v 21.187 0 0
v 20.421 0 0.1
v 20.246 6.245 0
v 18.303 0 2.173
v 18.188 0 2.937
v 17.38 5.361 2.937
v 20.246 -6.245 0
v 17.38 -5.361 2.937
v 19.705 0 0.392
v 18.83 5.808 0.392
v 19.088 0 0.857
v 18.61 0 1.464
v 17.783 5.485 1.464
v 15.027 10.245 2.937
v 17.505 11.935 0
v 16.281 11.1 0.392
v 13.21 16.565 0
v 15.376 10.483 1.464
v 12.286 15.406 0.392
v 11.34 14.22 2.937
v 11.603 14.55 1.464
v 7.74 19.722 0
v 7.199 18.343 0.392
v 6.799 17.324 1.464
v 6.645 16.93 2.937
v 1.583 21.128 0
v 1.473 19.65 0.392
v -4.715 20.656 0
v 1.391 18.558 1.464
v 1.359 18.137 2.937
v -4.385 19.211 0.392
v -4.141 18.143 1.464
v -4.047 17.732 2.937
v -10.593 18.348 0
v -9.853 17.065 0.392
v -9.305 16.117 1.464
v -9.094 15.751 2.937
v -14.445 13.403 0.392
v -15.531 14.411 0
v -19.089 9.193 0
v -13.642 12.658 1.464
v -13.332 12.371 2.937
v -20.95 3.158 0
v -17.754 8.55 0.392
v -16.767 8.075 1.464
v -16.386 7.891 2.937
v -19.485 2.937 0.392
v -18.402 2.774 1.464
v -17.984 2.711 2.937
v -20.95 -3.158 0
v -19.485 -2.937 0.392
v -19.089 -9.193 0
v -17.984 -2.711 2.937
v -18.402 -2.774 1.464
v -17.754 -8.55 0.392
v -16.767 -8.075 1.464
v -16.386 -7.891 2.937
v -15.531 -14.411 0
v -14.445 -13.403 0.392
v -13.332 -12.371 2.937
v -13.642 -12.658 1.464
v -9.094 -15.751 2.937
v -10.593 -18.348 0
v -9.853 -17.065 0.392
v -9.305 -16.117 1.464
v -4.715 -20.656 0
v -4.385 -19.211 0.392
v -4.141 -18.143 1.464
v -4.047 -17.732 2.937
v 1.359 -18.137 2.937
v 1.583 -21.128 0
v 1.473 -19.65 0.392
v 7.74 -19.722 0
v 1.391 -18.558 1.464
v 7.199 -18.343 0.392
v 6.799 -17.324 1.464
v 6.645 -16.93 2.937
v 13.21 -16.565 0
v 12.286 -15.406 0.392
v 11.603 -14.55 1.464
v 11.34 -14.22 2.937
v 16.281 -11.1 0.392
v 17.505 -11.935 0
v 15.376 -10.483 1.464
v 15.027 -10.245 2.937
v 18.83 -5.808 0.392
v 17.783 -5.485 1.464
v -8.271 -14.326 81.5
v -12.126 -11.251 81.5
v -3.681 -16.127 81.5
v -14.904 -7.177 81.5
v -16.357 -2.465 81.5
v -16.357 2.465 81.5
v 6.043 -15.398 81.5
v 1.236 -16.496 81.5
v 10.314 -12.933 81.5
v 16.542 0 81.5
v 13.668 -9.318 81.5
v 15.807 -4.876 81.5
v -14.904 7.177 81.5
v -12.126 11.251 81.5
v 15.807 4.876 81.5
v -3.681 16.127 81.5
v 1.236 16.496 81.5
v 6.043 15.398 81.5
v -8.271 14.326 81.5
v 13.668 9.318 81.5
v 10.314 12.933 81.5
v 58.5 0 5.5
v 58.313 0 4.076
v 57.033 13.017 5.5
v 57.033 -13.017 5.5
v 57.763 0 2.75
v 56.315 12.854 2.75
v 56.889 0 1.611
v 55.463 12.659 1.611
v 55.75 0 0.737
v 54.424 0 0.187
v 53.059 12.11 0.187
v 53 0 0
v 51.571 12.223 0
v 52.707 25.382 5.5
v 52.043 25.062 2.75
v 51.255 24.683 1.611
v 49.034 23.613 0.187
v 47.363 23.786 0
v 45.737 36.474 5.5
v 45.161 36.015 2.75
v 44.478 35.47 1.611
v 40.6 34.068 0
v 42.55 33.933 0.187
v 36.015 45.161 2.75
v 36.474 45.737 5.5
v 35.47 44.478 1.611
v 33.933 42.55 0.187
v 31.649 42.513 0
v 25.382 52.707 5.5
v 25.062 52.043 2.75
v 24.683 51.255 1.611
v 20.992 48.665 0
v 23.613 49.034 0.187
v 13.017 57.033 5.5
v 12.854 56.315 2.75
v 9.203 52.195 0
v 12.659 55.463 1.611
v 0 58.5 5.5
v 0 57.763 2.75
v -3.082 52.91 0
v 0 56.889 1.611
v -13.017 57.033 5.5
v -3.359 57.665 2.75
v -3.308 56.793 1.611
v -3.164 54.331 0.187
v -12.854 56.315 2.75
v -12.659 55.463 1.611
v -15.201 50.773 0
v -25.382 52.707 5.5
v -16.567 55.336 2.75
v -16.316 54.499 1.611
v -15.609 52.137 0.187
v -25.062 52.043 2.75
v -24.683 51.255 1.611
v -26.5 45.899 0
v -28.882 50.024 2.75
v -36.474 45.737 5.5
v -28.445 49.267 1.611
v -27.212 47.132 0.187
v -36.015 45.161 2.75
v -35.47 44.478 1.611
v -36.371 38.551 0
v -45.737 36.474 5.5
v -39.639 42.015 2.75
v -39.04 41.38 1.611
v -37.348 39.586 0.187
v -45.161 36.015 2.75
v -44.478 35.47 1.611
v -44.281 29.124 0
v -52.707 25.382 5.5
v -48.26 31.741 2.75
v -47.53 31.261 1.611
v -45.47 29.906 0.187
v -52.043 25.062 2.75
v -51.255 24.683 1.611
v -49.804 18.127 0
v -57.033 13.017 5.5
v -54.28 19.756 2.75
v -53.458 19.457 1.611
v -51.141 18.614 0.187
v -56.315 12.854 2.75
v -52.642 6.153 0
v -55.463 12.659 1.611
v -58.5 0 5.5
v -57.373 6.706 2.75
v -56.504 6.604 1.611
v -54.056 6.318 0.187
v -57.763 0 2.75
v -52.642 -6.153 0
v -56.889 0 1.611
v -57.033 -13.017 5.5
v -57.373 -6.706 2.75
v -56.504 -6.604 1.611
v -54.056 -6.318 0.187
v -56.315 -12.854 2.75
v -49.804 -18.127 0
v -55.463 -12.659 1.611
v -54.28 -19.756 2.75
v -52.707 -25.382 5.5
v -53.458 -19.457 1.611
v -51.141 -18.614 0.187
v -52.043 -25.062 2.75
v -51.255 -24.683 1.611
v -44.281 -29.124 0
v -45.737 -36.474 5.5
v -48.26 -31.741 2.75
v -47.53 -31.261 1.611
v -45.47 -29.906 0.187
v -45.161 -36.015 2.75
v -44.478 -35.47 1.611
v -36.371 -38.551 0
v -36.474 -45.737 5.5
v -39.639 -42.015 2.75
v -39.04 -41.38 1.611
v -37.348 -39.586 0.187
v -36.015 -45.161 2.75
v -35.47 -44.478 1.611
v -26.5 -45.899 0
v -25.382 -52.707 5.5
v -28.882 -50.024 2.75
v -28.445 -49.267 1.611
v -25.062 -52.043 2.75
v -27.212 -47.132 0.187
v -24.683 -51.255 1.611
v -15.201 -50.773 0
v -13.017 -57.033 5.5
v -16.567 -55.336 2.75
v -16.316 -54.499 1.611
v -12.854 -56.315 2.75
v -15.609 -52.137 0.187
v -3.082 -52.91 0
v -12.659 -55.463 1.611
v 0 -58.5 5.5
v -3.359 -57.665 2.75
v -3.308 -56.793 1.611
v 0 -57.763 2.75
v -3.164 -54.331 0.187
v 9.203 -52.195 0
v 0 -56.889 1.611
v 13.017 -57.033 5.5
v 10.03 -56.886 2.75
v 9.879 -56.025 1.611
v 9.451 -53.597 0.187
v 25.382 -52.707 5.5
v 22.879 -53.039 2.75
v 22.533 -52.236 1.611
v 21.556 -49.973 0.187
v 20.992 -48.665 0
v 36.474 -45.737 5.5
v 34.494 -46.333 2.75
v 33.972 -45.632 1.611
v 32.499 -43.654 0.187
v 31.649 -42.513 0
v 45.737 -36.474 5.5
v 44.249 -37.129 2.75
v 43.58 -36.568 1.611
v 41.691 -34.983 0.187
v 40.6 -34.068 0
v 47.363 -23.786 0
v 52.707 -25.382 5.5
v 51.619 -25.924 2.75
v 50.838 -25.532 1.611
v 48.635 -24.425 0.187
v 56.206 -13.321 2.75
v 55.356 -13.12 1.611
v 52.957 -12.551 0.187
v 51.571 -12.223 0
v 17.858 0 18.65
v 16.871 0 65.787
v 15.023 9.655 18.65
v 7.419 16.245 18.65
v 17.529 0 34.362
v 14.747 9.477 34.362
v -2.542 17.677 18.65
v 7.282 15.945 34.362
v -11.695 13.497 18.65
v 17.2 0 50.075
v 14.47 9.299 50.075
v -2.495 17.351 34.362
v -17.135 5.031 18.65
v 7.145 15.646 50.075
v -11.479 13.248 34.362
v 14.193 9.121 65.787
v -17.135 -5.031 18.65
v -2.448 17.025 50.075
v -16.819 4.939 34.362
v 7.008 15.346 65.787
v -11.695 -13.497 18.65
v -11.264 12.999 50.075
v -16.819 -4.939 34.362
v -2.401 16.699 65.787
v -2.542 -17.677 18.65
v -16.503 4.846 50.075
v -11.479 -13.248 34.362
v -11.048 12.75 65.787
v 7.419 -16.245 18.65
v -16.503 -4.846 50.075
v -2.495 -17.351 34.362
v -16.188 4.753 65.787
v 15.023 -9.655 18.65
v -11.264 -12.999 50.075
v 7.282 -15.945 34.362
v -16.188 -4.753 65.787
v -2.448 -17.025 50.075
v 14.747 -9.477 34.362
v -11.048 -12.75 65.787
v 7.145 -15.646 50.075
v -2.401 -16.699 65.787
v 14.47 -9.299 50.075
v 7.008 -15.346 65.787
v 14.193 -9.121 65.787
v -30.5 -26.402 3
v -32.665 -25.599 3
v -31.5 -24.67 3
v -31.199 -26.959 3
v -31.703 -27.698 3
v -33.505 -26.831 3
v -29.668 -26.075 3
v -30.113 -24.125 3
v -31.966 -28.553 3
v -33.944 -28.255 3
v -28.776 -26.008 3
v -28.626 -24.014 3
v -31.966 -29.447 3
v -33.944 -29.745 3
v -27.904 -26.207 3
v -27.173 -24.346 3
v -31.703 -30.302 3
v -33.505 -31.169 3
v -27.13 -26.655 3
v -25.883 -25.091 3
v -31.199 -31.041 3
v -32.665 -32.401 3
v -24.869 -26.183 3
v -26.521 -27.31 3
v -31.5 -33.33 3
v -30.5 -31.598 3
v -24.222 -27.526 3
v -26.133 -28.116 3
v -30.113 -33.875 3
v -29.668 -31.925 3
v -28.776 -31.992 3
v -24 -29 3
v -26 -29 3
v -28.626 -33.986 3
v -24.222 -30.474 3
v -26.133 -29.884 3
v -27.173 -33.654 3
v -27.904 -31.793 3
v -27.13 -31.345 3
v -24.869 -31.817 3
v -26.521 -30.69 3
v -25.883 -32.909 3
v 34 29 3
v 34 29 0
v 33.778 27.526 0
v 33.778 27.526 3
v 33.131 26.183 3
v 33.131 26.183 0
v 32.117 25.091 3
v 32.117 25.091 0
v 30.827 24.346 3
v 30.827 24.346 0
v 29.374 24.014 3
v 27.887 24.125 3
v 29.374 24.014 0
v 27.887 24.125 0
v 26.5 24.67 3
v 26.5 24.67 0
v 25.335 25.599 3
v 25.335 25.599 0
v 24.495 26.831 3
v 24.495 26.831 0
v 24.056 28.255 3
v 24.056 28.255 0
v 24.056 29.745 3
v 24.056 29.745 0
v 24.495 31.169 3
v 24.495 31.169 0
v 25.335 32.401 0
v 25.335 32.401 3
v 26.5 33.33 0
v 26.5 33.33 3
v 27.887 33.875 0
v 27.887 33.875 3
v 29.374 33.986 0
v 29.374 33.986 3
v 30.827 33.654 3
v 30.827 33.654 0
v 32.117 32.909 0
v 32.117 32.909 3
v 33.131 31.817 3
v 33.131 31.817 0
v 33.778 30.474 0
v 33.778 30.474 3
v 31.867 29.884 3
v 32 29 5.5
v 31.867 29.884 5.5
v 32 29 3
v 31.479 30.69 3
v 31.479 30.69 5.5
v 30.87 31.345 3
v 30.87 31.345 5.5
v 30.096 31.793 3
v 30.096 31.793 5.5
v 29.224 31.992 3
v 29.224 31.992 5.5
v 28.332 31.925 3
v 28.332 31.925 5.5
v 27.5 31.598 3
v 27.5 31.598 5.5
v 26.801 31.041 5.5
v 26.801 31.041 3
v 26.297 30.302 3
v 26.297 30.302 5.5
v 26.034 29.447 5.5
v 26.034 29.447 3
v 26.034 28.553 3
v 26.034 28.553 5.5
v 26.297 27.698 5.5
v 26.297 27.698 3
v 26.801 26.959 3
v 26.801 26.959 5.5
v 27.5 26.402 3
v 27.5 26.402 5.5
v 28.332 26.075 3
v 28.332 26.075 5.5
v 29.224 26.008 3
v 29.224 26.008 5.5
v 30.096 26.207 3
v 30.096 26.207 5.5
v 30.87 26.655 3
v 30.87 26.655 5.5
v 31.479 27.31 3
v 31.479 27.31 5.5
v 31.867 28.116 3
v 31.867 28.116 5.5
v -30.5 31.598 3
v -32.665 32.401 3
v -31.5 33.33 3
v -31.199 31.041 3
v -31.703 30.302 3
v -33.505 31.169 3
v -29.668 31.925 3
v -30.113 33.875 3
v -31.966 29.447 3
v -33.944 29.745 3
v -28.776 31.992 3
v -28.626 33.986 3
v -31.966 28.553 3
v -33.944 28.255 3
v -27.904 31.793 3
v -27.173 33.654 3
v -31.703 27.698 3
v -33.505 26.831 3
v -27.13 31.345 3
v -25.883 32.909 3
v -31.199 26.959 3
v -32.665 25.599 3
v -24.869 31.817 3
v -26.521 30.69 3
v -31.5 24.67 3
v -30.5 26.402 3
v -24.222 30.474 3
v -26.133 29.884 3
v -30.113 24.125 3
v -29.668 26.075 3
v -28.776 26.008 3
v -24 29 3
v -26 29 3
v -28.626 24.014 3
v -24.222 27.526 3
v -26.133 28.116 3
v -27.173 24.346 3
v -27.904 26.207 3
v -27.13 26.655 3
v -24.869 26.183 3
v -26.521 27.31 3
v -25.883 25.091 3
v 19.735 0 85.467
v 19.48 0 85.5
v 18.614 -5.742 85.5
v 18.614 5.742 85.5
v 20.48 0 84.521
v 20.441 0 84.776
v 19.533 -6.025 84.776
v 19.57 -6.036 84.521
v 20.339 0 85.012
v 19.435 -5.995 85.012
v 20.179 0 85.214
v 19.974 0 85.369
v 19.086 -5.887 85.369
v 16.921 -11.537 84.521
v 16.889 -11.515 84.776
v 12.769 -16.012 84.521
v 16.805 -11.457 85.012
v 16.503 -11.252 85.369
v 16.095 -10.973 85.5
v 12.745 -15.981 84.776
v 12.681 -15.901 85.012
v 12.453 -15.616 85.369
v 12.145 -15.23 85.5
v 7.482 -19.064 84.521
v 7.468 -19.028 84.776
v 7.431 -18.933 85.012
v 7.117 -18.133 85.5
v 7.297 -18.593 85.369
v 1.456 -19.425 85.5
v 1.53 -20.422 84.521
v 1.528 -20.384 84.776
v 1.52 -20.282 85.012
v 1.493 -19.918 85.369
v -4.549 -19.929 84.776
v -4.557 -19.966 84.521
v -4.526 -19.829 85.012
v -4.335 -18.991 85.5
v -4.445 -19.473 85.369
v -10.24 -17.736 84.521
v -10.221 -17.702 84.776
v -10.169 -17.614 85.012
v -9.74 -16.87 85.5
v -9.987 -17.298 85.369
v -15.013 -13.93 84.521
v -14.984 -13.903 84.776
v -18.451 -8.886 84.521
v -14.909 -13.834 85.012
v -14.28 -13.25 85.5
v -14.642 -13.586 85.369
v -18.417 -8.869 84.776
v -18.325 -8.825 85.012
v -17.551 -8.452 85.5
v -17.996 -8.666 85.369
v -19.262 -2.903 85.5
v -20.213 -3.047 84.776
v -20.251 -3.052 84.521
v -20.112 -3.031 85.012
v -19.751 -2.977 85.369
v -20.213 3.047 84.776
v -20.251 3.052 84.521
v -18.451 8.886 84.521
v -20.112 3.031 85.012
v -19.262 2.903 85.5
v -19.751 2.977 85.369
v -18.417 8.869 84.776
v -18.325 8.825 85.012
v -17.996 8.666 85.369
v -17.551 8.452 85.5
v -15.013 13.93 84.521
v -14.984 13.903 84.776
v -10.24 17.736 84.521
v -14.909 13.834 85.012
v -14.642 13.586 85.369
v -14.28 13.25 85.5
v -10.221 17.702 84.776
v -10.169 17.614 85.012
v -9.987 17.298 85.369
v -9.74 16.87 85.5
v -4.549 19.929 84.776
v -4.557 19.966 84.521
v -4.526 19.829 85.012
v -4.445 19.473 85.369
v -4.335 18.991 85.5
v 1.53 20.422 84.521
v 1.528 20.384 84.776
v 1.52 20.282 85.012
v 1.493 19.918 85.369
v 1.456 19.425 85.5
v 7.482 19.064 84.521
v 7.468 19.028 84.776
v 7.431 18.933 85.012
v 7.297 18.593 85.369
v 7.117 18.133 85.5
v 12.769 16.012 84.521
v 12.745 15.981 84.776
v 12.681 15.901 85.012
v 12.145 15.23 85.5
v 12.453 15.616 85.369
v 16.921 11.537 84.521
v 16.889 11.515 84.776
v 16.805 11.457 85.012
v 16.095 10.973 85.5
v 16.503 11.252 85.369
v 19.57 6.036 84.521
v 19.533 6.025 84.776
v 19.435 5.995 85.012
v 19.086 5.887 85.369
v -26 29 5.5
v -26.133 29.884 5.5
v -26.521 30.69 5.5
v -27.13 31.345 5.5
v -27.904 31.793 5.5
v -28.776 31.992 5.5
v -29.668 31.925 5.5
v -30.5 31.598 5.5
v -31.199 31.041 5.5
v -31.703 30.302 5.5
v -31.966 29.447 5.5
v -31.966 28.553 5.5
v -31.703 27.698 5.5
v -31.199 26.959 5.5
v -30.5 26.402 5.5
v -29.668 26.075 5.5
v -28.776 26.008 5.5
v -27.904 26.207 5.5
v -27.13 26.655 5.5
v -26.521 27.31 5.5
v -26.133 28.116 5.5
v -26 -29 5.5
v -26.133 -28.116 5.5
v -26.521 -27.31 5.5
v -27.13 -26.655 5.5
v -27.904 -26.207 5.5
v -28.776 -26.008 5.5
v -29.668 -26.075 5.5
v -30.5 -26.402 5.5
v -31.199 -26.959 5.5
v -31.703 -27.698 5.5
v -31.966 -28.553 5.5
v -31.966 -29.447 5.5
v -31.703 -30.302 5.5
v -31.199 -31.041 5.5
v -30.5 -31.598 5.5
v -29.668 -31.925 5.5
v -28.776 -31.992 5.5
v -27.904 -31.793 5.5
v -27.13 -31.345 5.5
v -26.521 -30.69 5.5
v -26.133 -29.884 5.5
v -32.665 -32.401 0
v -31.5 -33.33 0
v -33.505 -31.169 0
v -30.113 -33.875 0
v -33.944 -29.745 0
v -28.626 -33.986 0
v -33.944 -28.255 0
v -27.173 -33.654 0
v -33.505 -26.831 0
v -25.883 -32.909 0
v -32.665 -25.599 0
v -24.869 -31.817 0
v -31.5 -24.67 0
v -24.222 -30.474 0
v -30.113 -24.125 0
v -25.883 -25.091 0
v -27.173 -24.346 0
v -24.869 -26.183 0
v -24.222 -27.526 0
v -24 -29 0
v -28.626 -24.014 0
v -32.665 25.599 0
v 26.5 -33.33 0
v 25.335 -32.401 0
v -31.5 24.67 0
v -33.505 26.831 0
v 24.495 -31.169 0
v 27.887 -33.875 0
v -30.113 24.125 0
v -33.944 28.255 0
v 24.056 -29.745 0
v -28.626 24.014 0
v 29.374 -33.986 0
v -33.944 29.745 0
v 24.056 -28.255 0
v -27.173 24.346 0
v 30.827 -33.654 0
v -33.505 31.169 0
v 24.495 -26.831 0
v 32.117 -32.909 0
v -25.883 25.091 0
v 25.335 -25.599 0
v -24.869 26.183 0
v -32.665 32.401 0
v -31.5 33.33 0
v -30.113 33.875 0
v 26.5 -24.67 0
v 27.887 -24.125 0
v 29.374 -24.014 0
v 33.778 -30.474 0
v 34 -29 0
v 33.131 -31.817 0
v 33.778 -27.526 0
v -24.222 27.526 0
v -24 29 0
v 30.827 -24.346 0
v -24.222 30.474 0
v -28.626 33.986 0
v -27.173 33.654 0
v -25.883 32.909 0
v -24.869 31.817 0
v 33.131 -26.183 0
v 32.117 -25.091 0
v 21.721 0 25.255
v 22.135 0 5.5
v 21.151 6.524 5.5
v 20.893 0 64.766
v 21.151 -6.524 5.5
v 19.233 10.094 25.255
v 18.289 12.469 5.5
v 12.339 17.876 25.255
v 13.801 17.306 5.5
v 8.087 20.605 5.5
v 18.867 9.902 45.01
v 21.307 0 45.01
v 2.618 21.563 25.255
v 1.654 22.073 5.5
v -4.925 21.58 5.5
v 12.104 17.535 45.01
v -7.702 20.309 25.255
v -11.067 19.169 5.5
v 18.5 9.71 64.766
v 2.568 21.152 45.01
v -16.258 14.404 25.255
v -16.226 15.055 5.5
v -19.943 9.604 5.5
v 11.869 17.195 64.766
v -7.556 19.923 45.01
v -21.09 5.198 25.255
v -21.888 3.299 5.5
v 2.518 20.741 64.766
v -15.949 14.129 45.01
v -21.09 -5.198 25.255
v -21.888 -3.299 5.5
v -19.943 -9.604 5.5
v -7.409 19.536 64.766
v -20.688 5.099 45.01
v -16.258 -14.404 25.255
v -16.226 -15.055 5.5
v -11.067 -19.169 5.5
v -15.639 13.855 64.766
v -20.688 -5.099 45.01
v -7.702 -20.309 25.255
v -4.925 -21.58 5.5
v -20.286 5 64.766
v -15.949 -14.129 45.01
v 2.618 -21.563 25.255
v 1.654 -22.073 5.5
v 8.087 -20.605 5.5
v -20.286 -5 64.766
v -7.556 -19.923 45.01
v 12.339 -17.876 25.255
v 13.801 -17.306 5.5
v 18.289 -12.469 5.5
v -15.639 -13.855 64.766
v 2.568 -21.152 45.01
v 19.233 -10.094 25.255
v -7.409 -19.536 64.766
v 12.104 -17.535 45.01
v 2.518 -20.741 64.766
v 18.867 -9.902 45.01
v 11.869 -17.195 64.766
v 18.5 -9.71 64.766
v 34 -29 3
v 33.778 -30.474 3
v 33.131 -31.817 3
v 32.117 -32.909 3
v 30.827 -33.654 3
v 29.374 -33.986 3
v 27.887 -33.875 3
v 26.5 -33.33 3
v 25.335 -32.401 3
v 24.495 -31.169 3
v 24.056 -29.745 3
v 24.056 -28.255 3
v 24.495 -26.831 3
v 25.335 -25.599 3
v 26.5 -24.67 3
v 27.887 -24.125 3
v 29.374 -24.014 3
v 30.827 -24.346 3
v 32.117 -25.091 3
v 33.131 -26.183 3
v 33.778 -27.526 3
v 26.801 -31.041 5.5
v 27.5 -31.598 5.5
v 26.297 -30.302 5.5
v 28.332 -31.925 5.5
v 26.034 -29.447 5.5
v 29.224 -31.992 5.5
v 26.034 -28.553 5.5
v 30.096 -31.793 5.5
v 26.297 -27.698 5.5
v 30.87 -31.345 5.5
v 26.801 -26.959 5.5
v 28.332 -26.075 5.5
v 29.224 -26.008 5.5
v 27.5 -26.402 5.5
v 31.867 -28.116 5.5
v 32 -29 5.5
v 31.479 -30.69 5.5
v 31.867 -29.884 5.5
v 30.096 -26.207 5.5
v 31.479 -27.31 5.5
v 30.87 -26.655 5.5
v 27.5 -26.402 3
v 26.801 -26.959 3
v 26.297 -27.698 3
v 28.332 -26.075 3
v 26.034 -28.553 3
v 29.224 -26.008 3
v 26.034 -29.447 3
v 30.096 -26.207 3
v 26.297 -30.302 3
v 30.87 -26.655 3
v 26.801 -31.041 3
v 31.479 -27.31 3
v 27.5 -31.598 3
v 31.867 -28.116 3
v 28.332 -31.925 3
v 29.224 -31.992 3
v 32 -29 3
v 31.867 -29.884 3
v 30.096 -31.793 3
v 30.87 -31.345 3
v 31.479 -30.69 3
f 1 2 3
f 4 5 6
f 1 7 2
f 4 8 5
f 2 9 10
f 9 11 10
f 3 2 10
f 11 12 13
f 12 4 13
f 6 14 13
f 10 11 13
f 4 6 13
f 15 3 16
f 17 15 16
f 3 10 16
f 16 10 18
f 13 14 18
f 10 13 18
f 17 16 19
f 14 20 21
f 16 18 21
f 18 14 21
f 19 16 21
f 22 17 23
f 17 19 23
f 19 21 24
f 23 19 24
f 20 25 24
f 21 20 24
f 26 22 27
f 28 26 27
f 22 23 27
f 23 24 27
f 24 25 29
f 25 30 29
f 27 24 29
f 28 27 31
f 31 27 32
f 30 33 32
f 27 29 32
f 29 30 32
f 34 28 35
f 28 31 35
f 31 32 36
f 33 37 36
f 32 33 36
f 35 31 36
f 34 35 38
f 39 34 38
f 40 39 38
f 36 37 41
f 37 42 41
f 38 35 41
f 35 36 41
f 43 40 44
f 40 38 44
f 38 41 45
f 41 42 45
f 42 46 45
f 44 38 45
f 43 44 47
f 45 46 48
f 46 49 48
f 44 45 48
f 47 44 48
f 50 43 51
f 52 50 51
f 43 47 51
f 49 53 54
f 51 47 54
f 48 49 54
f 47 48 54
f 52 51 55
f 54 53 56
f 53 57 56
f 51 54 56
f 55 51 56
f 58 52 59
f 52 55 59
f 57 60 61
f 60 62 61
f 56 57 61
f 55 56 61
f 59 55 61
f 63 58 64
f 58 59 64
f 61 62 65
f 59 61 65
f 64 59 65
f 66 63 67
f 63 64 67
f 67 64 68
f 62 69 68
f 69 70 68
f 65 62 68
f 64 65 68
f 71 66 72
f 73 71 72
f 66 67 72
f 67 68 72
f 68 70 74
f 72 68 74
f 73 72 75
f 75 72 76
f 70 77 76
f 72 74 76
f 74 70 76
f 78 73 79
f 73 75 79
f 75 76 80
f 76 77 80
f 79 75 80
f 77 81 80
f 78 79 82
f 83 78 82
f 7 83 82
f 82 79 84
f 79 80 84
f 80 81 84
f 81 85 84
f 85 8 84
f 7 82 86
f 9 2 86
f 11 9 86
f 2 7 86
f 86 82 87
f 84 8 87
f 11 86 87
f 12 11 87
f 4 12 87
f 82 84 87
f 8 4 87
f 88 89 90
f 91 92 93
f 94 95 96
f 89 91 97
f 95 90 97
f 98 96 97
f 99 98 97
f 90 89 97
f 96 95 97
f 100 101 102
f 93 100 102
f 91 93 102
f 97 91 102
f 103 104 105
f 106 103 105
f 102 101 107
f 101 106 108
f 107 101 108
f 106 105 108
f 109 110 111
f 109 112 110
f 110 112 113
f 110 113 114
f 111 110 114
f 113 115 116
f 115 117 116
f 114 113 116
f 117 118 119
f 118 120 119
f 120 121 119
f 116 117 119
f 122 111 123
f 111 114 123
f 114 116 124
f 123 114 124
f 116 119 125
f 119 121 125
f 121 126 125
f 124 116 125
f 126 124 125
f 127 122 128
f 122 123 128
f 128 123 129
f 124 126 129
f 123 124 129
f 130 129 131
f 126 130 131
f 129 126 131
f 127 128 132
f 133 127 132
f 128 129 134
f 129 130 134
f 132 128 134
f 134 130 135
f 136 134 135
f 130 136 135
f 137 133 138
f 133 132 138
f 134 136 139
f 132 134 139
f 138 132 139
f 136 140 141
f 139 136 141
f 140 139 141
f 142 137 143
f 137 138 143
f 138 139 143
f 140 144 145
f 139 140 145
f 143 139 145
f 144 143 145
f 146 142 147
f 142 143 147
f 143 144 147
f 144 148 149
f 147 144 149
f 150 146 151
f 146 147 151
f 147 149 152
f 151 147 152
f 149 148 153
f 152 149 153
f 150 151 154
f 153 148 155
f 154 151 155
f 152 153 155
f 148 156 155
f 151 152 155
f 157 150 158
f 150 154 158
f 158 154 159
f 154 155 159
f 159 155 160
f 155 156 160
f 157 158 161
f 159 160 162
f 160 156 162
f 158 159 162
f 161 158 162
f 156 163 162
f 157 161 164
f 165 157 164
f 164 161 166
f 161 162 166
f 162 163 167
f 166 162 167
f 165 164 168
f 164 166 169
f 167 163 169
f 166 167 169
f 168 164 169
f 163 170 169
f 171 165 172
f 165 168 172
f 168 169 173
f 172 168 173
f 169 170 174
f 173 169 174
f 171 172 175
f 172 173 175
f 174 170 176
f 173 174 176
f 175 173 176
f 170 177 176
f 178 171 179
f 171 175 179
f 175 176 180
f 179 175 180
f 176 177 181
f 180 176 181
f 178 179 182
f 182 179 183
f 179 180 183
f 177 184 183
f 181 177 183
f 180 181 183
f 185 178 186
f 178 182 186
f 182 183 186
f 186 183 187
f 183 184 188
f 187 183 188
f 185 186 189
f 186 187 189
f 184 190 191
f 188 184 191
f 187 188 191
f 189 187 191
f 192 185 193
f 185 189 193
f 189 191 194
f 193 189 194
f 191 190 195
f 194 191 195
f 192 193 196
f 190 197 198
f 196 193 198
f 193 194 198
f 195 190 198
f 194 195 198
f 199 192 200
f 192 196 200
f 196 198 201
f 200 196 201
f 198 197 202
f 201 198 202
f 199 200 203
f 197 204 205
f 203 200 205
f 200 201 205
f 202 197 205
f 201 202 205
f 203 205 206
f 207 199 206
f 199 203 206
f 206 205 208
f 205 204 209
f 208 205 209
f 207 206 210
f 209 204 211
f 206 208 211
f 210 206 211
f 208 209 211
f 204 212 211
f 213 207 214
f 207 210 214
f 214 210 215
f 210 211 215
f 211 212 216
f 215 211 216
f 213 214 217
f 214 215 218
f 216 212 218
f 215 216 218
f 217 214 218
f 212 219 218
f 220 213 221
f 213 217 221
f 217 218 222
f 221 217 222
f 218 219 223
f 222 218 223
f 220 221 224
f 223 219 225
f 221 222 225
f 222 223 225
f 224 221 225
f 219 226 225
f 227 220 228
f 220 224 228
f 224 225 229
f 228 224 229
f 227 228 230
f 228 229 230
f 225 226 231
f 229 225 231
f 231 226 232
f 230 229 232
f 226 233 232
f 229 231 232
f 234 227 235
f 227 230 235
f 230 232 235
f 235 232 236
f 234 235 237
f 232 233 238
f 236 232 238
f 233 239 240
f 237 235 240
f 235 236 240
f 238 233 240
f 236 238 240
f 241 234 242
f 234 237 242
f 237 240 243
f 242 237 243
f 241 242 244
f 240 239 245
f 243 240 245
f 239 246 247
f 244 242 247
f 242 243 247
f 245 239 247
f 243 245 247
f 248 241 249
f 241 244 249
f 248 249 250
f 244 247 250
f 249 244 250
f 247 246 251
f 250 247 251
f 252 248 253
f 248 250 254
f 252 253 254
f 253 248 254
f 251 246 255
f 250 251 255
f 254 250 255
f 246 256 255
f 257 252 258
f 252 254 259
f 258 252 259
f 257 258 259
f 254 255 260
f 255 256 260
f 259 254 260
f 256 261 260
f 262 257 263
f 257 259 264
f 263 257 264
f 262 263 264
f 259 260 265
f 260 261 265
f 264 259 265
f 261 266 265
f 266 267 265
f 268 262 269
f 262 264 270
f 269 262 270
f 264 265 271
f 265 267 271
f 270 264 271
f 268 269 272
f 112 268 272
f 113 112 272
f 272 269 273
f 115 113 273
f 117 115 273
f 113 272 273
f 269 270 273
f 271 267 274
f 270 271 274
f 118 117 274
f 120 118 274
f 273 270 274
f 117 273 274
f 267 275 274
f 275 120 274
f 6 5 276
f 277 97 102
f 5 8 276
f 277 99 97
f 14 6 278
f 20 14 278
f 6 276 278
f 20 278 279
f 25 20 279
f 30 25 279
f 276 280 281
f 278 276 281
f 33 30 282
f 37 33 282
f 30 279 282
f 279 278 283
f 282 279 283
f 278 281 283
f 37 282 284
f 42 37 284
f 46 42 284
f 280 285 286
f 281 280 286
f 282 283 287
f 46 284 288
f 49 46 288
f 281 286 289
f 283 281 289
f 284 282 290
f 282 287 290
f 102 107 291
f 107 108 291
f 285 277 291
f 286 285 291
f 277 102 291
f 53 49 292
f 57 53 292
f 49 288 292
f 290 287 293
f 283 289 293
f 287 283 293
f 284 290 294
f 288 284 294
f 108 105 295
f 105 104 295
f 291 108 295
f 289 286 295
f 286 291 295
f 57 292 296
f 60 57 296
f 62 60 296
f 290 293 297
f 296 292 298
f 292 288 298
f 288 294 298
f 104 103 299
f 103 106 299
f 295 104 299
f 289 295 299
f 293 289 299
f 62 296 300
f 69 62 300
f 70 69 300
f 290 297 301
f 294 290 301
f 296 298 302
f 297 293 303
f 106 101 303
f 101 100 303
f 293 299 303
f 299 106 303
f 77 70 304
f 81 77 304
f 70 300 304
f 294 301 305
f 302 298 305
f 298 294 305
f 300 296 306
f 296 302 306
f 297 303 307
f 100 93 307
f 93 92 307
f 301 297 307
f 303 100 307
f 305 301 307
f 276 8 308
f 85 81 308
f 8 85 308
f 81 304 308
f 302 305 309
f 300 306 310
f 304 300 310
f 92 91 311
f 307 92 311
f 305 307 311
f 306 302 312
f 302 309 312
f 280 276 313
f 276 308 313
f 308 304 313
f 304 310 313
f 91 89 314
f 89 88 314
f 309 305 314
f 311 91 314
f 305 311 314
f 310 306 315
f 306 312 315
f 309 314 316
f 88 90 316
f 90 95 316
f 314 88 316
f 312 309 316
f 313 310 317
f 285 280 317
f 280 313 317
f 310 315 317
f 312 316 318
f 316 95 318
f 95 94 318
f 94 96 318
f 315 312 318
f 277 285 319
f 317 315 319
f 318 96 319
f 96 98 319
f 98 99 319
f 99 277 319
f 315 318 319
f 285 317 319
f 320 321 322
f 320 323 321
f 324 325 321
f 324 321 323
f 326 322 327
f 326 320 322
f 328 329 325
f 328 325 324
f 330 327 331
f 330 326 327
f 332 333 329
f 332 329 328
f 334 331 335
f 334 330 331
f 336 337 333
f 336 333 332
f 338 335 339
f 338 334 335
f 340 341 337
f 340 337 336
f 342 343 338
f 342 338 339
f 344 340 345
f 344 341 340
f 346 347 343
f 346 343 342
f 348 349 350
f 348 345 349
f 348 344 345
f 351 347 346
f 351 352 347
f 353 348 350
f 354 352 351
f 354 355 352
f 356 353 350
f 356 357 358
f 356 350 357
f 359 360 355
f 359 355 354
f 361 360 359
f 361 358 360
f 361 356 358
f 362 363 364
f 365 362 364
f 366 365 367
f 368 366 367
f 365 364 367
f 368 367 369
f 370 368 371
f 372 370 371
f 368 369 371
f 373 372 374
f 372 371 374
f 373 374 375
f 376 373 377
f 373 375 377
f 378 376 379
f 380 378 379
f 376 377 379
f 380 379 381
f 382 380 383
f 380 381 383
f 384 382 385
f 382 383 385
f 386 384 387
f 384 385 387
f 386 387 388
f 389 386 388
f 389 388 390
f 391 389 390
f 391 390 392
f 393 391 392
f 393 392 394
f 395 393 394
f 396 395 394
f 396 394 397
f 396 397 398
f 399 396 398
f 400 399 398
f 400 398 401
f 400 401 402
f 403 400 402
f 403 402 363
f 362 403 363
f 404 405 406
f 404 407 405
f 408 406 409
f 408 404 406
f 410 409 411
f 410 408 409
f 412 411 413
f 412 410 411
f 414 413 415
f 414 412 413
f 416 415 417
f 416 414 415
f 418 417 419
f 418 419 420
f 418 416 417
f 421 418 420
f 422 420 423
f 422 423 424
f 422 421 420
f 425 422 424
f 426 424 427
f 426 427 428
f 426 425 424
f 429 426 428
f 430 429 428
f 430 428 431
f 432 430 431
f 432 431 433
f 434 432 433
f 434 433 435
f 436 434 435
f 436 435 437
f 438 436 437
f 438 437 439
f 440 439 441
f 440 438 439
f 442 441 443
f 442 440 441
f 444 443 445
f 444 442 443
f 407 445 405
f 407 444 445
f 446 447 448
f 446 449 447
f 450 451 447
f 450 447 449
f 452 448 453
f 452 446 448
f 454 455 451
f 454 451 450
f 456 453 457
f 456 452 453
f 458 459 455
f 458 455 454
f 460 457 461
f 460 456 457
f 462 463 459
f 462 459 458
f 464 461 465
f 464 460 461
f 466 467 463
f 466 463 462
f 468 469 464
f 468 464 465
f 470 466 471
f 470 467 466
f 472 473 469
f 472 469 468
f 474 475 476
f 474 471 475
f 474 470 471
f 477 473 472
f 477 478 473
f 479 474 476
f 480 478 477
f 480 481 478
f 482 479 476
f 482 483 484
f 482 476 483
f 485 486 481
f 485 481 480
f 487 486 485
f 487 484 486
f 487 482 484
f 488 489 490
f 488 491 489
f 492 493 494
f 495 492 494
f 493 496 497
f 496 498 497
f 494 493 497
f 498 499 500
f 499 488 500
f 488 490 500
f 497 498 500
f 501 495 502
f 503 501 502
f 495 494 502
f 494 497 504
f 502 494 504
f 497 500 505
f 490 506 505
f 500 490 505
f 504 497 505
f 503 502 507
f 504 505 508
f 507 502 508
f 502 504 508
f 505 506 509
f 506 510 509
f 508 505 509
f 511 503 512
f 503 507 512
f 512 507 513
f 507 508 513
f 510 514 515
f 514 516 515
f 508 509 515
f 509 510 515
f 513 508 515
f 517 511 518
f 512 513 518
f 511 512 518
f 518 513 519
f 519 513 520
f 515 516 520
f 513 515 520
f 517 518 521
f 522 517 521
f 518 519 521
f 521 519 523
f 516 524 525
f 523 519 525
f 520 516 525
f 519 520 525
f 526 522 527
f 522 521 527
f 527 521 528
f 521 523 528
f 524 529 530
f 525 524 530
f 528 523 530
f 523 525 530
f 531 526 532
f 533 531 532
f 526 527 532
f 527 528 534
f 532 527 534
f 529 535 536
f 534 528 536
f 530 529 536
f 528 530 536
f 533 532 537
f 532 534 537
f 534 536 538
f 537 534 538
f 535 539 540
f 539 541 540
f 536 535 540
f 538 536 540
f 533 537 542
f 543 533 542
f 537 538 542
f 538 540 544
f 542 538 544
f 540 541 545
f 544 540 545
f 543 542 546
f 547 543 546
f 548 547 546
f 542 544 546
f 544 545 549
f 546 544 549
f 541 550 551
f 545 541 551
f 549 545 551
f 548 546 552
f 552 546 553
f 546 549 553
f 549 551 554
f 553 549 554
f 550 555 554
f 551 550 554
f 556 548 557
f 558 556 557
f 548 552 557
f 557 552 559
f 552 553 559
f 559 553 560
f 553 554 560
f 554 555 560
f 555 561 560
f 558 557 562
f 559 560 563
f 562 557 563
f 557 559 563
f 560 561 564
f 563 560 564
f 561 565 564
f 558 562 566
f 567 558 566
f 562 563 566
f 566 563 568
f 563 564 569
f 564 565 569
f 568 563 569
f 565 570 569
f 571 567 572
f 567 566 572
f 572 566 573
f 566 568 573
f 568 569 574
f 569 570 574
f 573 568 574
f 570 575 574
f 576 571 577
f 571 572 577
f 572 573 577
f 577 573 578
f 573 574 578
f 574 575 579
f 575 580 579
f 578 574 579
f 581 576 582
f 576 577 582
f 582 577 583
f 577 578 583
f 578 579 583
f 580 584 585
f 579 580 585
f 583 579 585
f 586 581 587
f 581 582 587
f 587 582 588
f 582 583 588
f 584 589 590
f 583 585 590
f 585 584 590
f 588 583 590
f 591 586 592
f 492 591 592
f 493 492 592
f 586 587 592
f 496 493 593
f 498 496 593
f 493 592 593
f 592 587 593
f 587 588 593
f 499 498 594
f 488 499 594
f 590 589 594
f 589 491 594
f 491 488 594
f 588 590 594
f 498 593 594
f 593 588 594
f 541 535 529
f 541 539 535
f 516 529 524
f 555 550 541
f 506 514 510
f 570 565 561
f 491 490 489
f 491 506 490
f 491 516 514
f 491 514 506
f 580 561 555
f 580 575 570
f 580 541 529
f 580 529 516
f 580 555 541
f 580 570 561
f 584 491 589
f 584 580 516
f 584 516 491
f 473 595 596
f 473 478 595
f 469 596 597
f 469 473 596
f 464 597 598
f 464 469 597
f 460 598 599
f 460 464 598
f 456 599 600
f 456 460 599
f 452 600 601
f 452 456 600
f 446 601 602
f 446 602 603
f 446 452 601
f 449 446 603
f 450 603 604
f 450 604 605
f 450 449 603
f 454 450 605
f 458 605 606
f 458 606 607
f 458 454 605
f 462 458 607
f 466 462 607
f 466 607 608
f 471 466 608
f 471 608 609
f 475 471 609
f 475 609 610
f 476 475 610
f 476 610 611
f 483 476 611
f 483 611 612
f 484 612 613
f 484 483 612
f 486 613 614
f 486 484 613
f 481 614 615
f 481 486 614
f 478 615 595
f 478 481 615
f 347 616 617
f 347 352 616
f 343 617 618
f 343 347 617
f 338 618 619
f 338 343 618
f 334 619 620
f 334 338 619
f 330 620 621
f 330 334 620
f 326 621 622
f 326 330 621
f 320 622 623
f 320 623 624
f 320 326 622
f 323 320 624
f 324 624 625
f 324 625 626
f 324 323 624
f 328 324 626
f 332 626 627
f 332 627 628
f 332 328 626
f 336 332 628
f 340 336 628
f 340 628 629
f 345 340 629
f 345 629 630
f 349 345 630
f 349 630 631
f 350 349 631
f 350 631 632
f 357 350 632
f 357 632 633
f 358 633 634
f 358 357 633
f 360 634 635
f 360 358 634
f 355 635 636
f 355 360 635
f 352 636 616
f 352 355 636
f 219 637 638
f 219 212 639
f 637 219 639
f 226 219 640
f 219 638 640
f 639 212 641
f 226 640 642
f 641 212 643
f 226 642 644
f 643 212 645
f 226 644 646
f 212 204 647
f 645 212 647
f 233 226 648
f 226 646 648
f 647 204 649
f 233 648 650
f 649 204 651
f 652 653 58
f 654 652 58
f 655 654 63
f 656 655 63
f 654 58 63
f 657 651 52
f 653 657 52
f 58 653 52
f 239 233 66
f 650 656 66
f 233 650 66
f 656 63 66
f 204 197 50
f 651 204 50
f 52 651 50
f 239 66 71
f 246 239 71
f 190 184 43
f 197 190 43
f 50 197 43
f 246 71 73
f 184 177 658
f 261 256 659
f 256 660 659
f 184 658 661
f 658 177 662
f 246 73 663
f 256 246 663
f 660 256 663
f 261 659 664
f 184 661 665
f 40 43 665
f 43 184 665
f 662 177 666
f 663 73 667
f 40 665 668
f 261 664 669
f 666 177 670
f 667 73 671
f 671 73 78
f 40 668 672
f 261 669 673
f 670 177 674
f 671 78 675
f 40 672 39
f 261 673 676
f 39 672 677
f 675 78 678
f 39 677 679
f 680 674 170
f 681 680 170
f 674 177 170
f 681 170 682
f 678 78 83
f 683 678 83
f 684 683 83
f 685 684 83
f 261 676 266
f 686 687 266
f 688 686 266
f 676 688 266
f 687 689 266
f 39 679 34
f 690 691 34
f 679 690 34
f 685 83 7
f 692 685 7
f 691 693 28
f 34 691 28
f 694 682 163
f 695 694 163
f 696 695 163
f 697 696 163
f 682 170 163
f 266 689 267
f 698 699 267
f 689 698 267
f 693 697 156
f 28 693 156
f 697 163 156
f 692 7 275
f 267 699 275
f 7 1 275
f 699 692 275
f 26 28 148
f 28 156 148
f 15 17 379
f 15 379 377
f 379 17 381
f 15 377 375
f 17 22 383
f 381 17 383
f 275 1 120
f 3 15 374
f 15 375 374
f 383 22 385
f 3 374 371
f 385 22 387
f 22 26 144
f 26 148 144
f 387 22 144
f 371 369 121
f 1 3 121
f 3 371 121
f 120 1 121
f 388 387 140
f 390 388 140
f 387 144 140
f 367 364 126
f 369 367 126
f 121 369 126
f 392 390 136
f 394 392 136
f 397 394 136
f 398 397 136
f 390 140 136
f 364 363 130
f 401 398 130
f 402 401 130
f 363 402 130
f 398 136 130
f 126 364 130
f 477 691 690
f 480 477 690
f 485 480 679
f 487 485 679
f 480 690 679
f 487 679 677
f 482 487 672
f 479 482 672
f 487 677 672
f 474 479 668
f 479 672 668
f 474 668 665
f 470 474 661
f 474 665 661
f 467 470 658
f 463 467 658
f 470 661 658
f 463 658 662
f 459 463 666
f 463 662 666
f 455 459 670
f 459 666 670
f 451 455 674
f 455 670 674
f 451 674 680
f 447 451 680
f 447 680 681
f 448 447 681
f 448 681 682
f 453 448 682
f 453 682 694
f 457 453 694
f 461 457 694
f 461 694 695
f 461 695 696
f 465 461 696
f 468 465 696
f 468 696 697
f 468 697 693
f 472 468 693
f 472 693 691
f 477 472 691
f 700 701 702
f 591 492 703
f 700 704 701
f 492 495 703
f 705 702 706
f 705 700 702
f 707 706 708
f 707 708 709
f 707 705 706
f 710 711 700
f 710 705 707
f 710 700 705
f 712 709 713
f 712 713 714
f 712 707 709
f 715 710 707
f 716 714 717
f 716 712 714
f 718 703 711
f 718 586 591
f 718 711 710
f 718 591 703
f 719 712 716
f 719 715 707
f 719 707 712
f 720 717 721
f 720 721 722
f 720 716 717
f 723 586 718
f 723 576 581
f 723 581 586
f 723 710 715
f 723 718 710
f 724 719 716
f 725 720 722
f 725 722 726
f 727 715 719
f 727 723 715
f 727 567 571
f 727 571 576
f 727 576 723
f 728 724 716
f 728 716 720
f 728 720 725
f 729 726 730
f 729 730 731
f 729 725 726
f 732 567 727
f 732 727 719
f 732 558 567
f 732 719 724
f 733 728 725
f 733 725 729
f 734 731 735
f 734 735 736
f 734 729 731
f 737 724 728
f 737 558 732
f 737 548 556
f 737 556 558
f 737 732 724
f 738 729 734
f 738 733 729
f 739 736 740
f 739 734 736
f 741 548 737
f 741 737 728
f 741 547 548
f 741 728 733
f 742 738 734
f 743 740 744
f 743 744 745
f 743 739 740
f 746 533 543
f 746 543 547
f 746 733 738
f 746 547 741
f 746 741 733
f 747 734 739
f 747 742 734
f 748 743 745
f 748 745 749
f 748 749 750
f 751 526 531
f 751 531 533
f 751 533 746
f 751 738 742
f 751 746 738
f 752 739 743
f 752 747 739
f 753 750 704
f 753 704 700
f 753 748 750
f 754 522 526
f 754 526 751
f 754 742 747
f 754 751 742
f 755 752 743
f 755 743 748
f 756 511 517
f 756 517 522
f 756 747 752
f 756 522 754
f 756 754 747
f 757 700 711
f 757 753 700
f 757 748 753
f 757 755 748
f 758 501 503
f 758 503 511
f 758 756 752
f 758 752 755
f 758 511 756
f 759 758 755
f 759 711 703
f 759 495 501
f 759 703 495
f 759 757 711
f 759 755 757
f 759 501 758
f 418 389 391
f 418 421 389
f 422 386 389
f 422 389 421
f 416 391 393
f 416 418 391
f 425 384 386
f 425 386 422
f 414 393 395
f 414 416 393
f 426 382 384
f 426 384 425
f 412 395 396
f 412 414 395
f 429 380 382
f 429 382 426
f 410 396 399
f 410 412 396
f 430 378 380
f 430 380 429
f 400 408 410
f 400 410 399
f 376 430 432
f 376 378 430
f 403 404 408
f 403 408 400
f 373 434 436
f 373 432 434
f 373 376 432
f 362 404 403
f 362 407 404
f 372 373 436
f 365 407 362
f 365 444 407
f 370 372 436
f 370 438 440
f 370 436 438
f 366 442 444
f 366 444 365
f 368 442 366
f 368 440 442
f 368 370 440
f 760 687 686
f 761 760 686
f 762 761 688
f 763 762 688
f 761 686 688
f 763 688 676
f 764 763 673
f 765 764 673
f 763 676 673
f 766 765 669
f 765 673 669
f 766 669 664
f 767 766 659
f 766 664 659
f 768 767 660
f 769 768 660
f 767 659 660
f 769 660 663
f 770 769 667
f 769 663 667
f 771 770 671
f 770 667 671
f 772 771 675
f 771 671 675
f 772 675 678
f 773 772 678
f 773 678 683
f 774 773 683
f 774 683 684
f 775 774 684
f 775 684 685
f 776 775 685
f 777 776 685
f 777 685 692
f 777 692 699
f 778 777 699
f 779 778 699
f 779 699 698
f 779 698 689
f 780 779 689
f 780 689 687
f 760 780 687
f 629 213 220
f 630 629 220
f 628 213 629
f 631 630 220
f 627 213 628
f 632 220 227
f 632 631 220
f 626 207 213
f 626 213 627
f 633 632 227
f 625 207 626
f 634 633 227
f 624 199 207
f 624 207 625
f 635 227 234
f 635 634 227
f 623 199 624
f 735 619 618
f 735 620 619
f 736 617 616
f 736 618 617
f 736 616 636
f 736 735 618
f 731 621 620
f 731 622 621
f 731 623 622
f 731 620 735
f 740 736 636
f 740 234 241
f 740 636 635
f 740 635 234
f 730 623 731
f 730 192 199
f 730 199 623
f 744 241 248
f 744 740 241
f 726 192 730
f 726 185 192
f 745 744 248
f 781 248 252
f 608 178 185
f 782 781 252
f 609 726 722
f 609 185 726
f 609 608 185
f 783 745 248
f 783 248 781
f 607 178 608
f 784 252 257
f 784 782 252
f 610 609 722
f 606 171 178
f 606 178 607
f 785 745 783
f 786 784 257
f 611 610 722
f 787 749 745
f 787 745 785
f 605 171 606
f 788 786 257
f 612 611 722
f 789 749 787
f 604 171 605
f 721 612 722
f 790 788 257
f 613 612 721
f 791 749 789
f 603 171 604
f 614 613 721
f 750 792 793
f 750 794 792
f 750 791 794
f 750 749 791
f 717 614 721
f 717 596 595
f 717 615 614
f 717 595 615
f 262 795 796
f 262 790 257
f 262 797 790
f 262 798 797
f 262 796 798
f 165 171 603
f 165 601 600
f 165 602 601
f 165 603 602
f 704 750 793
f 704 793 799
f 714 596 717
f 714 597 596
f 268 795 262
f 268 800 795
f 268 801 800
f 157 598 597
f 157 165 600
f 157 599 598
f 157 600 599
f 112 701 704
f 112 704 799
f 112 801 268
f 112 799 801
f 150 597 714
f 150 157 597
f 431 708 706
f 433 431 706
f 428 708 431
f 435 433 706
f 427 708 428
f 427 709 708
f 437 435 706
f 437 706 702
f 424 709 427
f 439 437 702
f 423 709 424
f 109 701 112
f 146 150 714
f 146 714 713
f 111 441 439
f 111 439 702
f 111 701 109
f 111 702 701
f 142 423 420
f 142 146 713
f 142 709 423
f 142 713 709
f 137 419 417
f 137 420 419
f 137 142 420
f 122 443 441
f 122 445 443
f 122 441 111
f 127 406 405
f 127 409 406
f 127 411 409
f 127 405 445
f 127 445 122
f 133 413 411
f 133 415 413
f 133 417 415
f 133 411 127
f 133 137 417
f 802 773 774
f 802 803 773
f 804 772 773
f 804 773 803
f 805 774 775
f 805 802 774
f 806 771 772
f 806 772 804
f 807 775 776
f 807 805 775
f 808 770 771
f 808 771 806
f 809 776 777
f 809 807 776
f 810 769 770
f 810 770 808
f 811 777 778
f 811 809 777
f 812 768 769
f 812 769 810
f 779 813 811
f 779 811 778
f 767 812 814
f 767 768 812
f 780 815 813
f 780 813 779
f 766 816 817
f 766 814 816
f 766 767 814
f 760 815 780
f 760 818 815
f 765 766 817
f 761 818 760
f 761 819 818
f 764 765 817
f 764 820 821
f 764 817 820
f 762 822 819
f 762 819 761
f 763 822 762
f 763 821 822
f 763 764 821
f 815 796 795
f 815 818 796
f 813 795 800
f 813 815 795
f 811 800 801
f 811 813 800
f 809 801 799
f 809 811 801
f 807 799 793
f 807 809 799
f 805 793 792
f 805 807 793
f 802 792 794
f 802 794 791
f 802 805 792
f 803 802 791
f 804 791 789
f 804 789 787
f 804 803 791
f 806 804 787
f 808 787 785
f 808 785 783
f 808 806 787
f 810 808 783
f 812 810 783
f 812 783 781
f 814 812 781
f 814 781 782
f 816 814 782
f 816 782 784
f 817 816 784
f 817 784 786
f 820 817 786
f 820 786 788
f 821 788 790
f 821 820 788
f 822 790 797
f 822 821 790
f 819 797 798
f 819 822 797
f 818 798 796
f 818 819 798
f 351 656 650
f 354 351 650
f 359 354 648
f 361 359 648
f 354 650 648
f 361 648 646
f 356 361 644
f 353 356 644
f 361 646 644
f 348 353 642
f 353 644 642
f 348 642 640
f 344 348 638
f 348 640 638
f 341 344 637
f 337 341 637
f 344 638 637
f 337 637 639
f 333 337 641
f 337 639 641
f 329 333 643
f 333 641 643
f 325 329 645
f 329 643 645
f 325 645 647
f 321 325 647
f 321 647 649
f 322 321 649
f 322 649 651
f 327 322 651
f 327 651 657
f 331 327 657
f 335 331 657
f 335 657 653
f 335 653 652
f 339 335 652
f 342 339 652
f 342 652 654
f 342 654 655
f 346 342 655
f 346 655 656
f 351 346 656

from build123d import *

# Parameters (mm, degrees)
F0_R           = 22.25
F0_R_2         = 21.25
F1_DEPTH       = 85.5
F1_TAPER       = 1.2
F2_T           = -4
F0_R_3         = 58.5
F0_R_4         = 3
F3_DEPTH       = 5.5
F4_R           = 5.49999
F5_D           = 6
F5_DEPTH       = 5
F5_CBORE_D     = 10
F5_CBORE_DEPTH = 3
F5_TIP         = 1.8025818571
F6_R           = 1
F7_R           = 3


# Not quite as in the source:
# - a fillet or chamfer is up to 0.001 mm smaller than in the source, because OpenCascade refuses the exact size


with BuildPart() as f1:
    # F0 (on Top) → F1 (new body)
    with BuildSketch(Plane.XY):
        Circle(F0_R)
        Circle(F0_R_2, mode=Mode.SUBTRACT)
        Circle(F0_R_2)
    extrude(amount=F1_DEPTH, taper=F1_TAPER)

    # F2
    f2_openings = [f1.faces().sort_by_distance(p)[0] for p in [
        (0, 0, 0),
    ]]
    offset(amount=F2_T, openings=f2_openings)

    # F0 (on Top) → F3 (join)
    with BuildSketch(Plane.XY):
        Circle(F0_R_3)
        with Locations((-29, -29)):
            Circle(F0_R_4, mode=Mode.SUBTRACT)
        with Locations((29, -29)):
            Circle(F0_R_4, mode=Mode.SUBTRACT)
        with Locations((-29, 29)):
            Circle(F0_R_4, mode=Mode.SUBTRACT)
        Circle(F0_R, mode=Mode.SUBTRACT)
        with Locations((29, 29)):
            Circle(F0_R_4, mode=Mode.SUBTRACT)
        Circle(F0_R)
        Circle(F0_R_2, mode=Mode.SUBTRACT)
    extrude(amount=F3_DEPTH)

    # F4 (radius 5.5 in the source; OpenCascade refuses exactly that, so slightly less here)
    f4_edges = [f1.edges().sort_by_distance(p)[0] for p in [
        (-58.5, 0, 0),
    ]]
    fillet(f4_edges, radius=F4_R)

    # F5
    with Locations(Plane(origin=(0, 0, 0), x_dir=(1, 0, 0), z_dir=(0, 0, -1))):
        with Locations((29, -29), (-29, -29), (-29, 29), (29, 29)):
            CounterBoreHole(F5_D / 2, F5_CBORE_D / 2, F5_CBORE_DEPTH, depth=F5_DEPTH)
            with Locations((0, 0, -(F5_DEPTH + F5_TIP / 2))):  # 118° drill point
                Cone(0, F5_D / 2, F5_TIP, mode=Mode.SUBTRACT)

    # F6
    f6_edges = [f1.edges().sort_by_distance(p)[0] for p in [
        (-20.45903, 0, 85.5),
    ]]
    fillet(f6_edges, radius=F6_R)

    # F7
    f7_edges = [f1.edges().sort_by_distance(p)[0] for p in [
        (-18.249123, 0, 0),
    ]]
    fillet(f7_edges, radius=F7_R)


solid = f1.part
